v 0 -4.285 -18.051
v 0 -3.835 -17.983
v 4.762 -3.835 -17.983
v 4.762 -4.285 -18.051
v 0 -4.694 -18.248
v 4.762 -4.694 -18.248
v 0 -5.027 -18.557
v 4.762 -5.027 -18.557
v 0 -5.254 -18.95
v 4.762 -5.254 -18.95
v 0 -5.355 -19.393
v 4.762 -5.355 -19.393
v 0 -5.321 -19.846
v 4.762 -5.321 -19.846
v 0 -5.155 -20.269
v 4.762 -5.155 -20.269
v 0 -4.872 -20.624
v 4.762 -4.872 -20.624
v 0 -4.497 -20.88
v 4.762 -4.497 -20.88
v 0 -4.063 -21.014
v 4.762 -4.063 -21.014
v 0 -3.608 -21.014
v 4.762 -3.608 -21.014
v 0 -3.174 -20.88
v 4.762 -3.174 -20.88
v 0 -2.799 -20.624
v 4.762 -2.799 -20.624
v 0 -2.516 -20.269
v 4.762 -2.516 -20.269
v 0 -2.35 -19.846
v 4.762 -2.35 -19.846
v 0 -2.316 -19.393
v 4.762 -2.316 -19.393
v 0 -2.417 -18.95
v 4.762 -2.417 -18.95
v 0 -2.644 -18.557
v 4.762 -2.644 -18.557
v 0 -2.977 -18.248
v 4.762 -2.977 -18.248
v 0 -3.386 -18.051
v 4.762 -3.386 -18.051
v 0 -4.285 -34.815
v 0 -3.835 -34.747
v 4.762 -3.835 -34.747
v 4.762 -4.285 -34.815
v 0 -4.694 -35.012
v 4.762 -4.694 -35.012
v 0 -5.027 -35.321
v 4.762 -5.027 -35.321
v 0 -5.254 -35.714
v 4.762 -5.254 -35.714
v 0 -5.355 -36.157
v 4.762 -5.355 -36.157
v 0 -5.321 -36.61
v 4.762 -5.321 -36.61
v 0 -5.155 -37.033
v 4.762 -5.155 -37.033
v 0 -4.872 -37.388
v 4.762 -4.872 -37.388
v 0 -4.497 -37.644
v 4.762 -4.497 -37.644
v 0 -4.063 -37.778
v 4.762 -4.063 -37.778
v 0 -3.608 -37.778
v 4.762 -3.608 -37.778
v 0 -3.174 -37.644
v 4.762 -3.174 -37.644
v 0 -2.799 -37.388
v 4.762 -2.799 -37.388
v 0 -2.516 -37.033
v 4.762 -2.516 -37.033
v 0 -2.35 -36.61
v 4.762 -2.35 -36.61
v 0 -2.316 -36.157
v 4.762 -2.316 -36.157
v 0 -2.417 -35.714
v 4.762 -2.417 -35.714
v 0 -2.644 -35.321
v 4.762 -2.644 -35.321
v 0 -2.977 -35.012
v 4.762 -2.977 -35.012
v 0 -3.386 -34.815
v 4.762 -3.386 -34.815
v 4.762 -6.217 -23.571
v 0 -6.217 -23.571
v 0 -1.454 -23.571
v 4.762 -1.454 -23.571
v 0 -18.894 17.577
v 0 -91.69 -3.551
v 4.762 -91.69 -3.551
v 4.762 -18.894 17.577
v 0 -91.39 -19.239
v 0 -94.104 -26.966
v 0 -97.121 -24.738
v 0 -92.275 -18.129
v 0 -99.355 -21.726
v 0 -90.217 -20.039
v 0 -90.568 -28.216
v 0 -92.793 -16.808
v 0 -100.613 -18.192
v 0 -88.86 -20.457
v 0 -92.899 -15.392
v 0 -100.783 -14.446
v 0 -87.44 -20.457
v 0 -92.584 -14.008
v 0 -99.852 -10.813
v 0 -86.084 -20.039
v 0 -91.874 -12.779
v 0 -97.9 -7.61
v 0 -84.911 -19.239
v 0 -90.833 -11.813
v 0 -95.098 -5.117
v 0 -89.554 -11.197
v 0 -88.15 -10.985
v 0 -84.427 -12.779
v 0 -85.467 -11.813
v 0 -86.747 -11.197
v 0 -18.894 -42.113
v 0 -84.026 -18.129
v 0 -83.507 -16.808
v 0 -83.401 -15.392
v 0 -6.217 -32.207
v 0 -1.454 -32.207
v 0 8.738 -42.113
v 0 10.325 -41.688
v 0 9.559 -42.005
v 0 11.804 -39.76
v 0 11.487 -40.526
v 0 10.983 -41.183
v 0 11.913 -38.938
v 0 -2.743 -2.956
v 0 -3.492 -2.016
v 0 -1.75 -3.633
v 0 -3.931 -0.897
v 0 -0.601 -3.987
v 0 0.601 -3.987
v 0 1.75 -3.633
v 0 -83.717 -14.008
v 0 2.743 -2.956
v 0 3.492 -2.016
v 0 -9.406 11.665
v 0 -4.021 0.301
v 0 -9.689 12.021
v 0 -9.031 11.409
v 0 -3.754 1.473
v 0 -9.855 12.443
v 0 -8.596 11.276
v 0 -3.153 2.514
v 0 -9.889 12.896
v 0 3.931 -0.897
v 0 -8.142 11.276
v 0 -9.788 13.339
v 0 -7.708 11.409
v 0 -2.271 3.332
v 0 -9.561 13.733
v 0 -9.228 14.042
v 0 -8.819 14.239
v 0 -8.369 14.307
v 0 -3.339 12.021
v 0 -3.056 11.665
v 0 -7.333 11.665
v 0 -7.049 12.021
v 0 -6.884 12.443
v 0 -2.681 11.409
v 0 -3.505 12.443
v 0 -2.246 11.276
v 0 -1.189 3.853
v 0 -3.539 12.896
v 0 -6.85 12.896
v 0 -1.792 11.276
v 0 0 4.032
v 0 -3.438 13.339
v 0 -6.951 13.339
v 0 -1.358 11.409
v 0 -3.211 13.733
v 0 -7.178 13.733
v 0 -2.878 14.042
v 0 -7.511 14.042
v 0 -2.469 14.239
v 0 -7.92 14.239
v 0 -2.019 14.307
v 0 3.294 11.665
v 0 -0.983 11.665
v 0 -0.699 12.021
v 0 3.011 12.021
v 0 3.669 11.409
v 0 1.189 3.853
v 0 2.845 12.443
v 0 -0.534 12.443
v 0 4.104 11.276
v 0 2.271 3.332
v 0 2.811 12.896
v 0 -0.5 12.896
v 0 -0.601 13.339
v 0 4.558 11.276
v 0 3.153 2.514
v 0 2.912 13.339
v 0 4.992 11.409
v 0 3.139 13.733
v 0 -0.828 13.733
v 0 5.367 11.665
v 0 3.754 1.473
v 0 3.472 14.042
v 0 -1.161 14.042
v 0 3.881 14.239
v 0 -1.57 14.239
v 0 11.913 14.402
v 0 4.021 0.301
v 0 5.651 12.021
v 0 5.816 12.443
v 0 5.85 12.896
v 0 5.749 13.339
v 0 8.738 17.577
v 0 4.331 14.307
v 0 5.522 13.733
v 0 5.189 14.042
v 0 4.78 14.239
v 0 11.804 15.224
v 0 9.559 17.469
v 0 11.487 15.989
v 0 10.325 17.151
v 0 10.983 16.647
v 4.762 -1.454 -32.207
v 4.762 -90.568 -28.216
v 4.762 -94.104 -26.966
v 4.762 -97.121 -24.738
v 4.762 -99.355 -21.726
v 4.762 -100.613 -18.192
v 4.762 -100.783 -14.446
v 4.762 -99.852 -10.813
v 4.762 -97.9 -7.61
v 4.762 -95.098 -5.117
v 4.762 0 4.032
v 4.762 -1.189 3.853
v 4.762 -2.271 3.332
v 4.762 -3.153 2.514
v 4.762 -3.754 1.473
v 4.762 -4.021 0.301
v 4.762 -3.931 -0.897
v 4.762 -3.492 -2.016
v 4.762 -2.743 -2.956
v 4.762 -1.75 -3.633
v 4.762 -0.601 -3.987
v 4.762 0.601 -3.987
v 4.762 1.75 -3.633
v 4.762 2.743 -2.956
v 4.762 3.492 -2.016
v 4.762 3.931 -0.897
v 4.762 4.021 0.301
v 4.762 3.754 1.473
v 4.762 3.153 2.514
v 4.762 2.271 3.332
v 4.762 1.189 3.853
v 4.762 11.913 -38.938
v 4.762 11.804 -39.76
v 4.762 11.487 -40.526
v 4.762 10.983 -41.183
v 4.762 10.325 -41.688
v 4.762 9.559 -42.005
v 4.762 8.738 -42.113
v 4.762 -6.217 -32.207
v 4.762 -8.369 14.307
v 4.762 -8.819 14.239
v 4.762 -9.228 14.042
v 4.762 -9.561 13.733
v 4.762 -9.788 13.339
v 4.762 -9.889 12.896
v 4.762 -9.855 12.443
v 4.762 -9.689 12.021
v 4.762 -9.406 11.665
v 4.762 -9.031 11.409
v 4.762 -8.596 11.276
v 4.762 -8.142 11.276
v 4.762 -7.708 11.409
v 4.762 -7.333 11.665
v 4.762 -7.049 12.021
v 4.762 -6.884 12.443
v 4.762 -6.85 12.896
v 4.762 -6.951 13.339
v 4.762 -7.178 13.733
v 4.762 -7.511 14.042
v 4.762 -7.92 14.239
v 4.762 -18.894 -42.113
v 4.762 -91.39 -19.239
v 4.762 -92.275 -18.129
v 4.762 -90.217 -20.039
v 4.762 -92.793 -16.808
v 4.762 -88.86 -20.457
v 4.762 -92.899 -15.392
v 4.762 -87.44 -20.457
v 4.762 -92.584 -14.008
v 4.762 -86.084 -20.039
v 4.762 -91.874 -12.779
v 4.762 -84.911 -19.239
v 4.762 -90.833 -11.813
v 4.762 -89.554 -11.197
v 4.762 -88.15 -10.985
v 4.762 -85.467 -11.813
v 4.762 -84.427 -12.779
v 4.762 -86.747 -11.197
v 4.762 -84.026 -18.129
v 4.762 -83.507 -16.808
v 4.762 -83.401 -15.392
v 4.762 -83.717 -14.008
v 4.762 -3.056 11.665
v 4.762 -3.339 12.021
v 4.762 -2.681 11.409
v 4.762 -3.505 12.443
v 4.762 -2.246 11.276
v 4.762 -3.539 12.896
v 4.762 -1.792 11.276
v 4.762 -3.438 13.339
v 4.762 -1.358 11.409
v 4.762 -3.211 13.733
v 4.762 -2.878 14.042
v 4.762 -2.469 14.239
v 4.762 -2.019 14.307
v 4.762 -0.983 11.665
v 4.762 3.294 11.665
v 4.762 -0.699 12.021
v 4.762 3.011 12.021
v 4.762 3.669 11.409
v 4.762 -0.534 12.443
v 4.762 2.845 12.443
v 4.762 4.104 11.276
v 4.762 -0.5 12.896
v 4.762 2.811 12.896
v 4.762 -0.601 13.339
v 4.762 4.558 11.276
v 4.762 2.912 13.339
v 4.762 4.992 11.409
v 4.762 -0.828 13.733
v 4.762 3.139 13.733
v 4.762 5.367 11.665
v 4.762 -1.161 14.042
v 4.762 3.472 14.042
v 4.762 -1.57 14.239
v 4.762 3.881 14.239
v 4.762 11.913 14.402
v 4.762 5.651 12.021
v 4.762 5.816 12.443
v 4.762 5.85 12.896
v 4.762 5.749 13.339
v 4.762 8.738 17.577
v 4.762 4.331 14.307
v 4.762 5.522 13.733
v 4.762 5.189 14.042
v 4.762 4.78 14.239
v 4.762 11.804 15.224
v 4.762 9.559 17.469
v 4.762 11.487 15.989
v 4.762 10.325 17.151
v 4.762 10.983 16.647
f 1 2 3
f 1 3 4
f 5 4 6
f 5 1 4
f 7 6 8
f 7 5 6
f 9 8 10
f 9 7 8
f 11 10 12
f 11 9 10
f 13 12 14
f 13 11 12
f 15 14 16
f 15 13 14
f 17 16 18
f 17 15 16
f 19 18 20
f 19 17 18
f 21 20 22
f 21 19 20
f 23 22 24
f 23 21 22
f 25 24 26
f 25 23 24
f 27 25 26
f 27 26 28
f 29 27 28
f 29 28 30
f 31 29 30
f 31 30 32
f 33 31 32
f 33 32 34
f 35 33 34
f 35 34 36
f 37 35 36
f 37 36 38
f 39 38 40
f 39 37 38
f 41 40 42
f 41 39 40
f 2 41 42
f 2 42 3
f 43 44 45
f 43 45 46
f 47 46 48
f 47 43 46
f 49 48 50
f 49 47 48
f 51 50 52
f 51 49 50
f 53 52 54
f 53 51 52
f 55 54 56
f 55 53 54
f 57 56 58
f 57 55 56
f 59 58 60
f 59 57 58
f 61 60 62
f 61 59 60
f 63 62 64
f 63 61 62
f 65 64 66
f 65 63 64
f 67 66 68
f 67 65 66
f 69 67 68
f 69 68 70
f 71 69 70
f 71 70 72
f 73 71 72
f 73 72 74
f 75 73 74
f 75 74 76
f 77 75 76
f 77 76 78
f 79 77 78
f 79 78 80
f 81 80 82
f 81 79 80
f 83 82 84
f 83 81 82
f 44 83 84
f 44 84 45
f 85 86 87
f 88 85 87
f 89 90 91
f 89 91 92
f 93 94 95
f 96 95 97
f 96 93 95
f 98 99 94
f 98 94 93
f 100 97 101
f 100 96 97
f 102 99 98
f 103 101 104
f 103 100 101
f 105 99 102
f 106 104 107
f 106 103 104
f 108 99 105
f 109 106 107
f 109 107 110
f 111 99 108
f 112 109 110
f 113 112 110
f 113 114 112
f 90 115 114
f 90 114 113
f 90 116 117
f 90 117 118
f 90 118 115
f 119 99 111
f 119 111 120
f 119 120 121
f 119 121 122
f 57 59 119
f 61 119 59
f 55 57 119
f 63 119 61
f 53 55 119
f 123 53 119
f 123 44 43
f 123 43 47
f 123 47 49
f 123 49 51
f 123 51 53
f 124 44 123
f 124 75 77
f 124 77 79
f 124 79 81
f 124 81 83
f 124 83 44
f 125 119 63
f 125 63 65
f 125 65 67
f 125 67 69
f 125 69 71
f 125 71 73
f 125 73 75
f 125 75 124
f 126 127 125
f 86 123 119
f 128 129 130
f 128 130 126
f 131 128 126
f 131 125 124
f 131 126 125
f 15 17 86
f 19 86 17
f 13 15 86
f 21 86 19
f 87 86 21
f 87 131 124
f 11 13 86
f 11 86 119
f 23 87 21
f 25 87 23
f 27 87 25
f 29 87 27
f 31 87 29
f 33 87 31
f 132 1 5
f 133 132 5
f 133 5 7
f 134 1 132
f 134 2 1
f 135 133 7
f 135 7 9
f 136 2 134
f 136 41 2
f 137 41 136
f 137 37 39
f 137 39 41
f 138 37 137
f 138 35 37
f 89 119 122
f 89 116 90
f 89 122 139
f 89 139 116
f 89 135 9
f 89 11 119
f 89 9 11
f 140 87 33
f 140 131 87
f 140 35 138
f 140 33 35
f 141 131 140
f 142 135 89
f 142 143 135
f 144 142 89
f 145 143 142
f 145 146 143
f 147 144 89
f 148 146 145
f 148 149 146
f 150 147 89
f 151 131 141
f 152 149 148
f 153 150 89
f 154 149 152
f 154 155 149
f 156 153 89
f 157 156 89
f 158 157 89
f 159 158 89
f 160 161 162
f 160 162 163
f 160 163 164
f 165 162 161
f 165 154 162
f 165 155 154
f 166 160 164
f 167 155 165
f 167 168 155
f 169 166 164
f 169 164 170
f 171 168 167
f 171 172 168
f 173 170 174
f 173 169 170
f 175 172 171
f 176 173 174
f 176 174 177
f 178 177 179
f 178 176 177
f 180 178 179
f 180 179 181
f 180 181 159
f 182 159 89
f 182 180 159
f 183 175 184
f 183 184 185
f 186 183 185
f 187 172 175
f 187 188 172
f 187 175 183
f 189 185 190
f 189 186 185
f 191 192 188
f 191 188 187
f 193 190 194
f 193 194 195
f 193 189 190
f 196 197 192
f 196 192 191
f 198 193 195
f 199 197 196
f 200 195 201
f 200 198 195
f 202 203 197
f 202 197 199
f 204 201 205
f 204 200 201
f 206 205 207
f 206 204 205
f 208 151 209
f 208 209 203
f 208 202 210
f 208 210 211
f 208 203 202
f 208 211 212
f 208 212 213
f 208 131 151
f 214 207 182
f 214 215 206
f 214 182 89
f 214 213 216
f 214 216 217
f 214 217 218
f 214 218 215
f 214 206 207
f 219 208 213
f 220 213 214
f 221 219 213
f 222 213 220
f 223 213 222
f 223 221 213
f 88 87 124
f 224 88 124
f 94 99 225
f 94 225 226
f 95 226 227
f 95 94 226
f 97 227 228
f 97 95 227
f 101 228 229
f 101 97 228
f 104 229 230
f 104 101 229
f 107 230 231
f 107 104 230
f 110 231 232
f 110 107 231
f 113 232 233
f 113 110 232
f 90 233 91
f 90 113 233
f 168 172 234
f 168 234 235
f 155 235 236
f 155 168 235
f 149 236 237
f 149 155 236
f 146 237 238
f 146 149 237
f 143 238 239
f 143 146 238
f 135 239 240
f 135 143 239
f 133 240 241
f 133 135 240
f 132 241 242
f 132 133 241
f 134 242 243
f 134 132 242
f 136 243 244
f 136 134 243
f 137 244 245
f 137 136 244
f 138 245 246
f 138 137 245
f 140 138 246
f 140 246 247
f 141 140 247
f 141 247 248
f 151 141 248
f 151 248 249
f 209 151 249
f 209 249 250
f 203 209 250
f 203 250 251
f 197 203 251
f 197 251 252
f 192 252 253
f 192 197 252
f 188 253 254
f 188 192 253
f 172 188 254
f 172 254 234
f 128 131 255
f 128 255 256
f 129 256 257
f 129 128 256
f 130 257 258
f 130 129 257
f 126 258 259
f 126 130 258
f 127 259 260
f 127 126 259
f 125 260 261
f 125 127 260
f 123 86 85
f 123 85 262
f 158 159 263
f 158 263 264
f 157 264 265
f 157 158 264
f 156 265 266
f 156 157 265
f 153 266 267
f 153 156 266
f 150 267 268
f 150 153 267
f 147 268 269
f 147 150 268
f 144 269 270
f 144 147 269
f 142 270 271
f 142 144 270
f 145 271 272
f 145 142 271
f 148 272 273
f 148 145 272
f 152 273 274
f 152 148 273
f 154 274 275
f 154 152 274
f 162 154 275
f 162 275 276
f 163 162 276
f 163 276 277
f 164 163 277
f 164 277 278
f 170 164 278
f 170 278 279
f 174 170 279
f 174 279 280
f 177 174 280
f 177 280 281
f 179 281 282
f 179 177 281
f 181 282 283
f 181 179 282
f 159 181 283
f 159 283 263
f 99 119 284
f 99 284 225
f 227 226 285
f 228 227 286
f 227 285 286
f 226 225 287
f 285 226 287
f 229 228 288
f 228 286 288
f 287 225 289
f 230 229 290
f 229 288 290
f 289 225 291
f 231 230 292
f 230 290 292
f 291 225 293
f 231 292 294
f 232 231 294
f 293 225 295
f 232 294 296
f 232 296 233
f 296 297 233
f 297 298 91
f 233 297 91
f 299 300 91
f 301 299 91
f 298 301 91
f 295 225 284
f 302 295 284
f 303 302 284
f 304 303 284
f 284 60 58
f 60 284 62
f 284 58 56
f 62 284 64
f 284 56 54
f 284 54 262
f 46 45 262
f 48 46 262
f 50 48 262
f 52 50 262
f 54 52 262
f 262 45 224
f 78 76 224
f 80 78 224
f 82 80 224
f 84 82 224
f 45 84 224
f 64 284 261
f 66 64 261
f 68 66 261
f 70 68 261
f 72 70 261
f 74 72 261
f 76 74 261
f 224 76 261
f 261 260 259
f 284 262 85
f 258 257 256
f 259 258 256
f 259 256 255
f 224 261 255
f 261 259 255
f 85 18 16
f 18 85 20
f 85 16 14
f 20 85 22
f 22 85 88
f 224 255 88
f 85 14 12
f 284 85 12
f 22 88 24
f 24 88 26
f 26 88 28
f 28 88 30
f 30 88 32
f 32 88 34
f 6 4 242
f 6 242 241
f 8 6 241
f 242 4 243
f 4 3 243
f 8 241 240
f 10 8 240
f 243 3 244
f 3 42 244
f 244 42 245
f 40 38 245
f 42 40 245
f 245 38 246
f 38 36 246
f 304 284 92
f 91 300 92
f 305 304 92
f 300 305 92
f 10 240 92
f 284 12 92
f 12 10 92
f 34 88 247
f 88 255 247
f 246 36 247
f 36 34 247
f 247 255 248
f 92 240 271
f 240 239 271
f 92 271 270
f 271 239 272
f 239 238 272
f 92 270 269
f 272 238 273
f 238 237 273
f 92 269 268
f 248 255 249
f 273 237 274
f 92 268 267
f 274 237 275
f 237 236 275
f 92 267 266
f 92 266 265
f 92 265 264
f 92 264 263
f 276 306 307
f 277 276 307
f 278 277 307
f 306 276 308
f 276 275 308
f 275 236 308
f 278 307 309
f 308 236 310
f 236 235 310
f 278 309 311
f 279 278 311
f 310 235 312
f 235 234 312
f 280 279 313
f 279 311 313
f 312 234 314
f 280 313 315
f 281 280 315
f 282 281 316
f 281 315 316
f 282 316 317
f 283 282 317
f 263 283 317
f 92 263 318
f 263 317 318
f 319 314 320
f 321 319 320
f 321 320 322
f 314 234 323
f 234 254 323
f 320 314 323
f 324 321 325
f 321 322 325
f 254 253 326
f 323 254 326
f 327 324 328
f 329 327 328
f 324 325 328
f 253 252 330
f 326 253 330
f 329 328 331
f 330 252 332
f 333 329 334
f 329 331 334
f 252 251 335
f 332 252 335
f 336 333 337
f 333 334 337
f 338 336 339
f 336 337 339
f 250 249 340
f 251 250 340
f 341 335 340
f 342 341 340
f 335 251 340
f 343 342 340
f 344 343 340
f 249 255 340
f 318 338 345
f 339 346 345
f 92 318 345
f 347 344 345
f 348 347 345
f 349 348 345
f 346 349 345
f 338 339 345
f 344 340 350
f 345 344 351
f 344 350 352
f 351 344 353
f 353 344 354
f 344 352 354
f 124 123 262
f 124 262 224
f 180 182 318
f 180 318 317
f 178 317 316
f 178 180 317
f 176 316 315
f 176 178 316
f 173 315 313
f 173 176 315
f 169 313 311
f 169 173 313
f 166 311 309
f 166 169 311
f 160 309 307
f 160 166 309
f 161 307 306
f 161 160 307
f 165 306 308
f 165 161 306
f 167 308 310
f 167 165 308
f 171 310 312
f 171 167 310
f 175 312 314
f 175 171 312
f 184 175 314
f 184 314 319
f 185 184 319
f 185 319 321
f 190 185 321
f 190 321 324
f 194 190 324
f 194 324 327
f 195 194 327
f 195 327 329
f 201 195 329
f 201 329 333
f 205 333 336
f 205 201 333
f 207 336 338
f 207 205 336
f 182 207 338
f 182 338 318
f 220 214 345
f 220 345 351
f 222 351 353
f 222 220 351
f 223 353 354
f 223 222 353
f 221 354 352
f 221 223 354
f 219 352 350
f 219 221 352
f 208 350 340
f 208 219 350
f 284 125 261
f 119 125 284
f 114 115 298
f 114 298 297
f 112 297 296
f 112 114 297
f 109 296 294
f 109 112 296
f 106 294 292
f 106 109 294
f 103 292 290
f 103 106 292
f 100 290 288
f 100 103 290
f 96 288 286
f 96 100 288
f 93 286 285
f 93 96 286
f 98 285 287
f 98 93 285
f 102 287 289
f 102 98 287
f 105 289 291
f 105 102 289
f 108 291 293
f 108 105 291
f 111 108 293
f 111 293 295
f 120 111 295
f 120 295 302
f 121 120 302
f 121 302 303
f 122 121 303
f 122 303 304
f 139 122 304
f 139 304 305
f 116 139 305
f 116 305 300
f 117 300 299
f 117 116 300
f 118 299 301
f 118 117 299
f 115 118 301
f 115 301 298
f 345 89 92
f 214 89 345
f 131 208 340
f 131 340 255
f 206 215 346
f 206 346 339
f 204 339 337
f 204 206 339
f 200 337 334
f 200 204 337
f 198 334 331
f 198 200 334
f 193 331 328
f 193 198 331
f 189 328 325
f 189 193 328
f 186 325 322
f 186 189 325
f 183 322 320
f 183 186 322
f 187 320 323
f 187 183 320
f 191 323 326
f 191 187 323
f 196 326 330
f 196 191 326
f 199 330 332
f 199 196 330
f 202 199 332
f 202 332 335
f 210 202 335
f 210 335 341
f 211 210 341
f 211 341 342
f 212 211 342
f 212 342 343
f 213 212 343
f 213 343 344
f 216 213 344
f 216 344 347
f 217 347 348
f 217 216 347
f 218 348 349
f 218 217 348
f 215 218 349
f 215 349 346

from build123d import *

# Parameters (mm, degrees)
SKETCH1_R           = 4.7625
SKETCH1_R_2         = 4.03225
SKETCH1_R_3         = 1.524
SKETCH1_W           = 8.636
SKETCH1_H           = 4.7625
BOSS_EXTRUDE1_DEPTH = 4.7625


with BuildPart() as part:
    # Sketch1 → Boss-Extrude1 (new body)
    with BuildSketch(Plane(origin=(0, 0, 0), x_dir=(0, 0, -1), z_dir=(1, 0, 0))):
        with BuildLine():
            Line((42.1132, 8.7376), (42.1132, -18.894289209))
            Line((42.1132, -18.894289209), (28.215665755, -90.567816907))
            ThreePointArc((28.215665755, -90.567816907), (16.325222884, -100.837177304), (3.551201687, -91.690222777))
            Line((3.551201687, -91.690222777), (-17.5768, -18.894289209))
            Line((-17.5768, -18.894289209), (-17.5768, 8.7376))
            ThreePointArc((-17.5768, 8.7376), (-16.64686403, 10.98266403), (-14.4018, 11.9126))
            Line((-14.4018, 11.9126), (38.9382, 11.9126))
            ThreePointArc((38.9382, 11.9126), (41.18326403, 10.98266403), (42.1132, 8.7376))
        make_face()
        with Locations(Location((15.747881426, -88.15030705, 0), (0, 0, 180))):
            Circle(SKETCH1_R, mode=Mode.SUBTRACT)
        with Locations(Location((0, 0, 0), (0, 0, 180))):
            Circle(SKETCH1_R_2, mode=Mode.SUBTRACT)
        with Locations(Location((-12.78255, 4.3307, 0), (0, 0, 180))):
            Circle(SKETCH1_R_3, mode=Mode.SUBTRACT)
        with Locations(Location((36.2712, -3.8354, 0), (0, 0, 180))):
            Circle(SKETCH1_R_3, mode=Mode.SUBTRACT)
        with Locations(Location((-12.78255, -2.0193, 0), (0, 0, 180))):
            Circle(SKETCH1_R_3, mode=Mode.SUBTRACT)
        with Locations(Location((-12.78255, -8.3693, 0), (0, 0, 180))):
            Circle(SKETCH1_R_3, mode=Mode.SUBTRACT)
        with Locations(Location((19.5072, -3.8354, 0), (0, 0, 180))):
            Circle(SKETCH1_R_3, mode=Mode.SUBTRACT)
        with Locations((27.8892, -3.8354)):
            Rectangle(SKETCH1_W, SKETCH1_H, mode=Mode.SUBTRACT)
    extrude(amount=BOSS_EXTRUDE1_DEPTH)


solid = part.part
